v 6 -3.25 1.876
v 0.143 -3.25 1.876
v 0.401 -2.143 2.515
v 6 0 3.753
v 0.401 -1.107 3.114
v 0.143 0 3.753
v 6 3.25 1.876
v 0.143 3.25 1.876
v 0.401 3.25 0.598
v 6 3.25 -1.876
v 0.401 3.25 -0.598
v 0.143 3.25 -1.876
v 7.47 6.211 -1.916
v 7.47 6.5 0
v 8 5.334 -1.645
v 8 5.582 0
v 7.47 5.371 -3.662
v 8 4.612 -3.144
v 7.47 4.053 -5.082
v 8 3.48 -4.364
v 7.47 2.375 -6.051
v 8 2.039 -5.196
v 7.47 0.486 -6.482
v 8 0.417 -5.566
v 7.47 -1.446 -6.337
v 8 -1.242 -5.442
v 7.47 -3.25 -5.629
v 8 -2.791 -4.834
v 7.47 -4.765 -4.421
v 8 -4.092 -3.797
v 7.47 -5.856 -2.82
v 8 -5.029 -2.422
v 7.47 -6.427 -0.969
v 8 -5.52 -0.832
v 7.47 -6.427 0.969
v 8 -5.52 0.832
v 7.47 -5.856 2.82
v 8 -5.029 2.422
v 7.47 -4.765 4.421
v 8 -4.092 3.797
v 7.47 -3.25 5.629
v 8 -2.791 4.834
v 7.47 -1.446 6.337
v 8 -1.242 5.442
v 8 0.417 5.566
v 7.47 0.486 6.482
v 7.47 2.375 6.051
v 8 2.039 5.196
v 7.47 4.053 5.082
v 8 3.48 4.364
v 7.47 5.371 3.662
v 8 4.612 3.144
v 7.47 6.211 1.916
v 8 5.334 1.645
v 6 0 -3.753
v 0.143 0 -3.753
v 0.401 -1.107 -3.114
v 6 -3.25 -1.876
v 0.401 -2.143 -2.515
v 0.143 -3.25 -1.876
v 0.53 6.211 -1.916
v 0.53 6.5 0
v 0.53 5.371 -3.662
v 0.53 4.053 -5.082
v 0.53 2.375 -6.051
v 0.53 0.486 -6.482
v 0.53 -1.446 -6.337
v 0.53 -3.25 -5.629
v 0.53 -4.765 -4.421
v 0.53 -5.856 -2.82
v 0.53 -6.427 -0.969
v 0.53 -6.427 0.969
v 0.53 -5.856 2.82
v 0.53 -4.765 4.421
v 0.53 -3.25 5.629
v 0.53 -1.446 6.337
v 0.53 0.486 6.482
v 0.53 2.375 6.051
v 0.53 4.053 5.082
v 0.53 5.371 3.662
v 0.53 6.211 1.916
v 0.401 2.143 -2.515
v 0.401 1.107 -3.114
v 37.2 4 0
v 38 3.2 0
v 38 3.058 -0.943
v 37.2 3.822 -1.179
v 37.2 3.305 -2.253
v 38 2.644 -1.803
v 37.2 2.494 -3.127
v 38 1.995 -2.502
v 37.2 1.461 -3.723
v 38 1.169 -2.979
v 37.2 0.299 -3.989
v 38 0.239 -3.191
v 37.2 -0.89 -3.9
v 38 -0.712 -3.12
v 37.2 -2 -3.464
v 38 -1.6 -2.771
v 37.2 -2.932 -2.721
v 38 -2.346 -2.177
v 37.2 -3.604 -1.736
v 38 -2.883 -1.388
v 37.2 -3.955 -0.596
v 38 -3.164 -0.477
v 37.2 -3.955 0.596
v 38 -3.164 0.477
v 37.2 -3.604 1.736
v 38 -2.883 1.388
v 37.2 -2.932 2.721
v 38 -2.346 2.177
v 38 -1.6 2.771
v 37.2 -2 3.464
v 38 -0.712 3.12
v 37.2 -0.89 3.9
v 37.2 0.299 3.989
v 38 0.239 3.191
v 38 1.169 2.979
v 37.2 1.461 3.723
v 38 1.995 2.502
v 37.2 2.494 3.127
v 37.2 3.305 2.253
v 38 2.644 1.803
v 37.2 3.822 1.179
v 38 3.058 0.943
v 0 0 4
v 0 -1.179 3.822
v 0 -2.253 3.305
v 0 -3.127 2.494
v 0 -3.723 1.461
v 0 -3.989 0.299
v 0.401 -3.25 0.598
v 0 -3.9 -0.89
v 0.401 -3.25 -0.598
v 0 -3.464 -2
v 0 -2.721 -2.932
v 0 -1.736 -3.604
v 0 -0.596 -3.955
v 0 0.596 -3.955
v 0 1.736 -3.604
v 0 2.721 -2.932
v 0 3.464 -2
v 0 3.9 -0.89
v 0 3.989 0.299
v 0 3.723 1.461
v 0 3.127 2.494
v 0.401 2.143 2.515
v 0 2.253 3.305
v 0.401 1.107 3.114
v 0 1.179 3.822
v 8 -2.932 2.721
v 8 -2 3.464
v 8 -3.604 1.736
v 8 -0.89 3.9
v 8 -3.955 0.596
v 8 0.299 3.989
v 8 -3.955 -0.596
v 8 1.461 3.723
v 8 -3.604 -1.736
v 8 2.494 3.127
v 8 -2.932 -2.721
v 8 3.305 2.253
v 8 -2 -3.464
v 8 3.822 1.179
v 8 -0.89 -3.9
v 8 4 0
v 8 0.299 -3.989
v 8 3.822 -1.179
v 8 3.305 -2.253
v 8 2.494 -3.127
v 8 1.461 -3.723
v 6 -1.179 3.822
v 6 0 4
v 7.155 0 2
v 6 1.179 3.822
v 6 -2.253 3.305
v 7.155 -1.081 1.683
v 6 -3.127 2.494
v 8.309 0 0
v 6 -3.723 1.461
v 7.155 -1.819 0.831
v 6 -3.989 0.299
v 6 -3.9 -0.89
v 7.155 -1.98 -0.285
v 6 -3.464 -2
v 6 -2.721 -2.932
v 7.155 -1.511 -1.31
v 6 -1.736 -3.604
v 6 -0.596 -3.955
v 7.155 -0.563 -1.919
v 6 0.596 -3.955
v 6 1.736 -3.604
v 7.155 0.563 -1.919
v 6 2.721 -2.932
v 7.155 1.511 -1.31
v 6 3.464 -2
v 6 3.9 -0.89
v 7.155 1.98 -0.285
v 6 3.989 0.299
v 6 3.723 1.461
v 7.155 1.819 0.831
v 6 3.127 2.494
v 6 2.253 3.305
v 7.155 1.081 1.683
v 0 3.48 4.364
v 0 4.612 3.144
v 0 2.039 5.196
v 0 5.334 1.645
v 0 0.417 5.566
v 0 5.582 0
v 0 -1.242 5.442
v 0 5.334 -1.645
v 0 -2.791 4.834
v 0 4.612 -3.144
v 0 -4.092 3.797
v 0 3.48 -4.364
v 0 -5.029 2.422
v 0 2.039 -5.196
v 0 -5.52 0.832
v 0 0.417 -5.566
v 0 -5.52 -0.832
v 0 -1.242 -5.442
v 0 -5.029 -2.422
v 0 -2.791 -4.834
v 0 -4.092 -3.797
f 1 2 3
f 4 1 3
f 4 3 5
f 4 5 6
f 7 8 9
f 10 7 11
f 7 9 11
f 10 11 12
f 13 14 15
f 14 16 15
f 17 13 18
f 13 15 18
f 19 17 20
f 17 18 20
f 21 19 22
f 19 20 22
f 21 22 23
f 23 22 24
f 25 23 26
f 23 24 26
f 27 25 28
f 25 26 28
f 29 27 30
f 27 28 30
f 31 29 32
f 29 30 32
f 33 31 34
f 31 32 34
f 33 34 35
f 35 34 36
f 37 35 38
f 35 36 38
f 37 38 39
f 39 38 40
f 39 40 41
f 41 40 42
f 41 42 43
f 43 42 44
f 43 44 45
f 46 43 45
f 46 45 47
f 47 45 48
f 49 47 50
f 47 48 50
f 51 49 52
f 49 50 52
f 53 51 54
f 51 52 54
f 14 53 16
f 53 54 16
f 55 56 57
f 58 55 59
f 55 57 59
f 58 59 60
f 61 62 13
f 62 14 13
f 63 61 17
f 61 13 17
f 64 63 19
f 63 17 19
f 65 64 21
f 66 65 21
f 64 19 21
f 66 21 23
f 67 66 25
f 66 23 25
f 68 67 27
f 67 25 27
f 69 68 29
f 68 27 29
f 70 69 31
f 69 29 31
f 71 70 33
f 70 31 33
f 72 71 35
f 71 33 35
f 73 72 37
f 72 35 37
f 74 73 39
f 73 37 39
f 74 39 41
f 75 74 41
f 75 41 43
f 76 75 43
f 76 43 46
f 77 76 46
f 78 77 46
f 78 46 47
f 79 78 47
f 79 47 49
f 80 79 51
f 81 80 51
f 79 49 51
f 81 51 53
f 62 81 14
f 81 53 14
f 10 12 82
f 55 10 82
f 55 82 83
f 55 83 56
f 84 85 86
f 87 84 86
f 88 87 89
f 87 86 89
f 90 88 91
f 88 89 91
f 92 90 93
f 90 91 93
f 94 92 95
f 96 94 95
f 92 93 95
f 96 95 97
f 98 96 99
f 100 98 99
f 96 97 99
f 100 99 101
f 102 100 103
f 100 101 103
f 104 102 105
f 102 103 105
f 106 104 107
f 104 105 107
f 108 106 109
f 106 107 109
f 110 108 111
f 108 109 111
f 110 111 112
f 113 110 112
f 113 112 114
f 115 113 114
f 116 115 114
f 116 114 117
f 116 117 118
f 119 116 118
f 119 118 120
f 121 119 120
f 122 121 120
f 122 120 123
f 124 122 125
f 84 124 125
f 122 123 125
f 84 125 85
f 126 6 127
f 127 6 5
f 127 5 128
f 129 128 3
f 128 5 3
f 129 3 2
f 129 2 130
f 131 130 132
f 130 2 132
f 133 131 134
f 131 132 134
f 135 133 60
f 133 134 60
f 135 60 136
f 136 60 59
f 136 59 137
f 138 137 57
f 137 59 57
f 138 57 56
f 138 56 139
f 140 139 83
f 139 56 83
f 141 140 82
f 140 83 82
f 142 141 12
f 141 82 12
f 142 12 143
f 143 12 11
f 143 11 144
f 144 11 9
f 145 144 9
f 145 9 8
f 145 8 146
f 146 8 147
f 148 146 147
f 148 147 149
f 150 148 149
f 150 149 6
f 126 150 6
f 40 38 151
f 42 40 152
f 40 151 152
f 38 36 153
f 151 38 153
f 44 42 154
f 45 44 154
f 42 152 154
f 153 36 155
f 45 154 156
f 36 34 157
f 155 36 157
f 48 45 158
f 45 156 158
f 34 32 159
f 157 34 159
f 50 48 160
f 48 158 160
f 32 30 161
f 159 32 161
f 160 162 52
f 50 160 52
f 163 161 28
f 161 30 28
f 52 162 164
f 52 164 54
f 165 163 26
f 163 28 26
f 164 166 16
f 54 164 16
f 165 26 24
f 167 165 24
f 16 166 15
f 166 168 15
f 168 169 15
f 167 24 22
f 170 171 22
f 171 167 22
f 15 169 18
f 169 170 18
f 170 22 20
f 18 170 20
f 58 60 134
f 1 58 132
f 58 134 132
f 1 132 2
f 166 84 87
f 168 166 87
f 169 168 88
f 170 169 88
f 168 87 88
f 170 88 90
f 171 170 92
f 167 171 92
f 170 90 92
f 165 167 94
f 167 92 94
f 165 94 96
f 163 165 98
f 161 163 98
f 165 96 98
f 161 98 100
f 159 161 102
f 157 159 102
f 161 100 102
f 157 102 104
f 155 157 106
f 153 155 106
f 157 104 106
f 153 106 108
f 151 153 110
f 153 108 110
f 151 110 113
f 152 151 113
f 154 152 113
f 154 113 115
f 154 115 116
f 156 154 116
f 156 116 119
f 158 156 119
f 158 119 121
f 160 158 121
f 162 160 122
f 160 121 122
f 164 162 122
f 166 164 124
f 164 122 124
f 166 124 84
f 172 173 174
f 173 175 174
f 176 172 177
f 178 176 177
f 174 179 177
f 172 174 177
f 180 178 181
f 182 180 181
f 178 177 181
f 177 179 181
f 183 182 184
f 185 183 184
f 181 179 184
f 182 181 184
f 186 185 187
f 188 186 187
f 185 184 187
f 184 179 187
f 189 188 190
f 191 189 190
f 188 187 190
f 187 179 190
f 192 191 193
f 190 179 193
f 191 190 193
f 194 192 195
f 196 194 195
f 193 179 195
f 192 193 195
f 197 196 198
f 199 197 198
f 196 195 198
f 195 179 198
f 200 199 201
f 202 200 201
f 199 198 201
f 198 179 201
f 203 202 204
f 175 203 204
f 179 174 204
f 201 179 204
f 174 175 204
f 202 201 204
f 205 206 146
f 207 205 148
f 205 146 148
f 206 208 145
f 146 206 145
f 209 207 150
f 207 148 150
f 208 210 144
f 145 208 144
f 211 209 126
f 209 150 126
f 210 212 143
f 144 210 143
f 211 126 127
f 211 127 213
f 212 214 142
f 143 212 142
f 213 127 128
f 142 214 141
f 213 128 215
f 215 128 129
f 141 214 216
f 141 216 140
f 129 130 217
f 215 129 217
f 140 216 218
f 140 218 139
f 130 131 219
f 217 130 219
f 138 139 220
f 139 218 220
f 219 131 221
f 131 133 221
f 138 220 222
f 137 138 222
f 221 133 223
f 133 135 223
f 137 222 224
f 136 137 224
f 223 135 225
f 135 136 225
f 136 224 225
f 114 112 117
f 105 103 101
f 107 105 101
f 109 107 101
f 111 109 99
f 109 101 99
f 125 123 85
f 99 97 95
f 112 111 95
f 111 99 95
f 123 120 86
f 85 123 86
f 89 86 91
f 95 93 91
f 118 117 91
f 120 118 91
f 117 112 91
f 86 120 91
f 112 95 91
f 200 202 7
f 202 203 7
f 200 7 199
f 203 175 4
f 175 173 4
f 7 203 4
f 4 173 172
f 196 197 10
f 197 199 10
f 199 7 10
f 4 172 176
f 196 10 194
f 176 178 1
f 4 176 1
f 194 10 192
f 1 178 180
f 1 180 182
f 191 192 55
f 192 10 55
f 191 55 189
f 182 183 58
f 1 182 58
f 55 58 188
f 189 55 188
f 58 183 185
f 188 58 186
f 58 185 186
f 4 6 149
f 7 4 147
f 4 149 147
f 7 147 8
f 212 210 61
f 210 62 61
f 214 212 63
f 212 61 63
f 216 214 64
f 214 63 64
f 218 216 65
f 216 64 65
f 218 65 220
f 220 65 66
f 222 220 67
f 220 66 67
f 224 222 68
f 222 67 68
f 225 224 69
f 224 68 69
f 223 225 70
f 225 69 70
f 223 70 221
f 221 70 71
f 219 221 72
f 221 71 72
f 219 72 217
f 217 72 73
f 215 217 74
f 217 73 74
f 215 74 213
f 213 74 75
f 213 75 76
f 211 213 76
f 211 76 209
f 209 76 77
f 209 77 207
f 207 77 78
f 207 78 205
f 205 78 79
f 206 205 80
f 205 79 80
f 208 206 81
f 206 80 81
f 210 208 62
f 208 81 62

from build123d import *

# Parameters (mm, degrees)
CHAMFER1_SIZE      = 0.8
CUT_EXTRUDE1_DEPTH = 6


with BuildPart() as part:
    # Sketch1 → Revolve1 (revolve)
    with BuildSketch(Plane.XY):
        Polygon((0, 0), (0, 5.582013072), (0.53, 6.5), (7.47, 6.5), (8, 5.582013072), (8, 4), (38, 4), (38, 0), align=None)
    revolve(axis=Axis((38, 0, 0), (-1, 0, 0)))

    # Chamfer1
    chamfer1_edges = [part.edges().sort_by_distance(p)[0] for p in [
        (38, -4, 0),
    ]]
    chamfer(chamfer1_edges, length=CHAMFER1_SIZE)

    # Sketch2 → Cut-Extrude1 (cut)
    with BuildSketch(Plane.ZY):
        Polygon((3.75277675, 0), (1.876388375, 3.25), (-1.876388375, 3.25), (-3.75277675, 0), (-1.876388375, -3.25), (1.876388375, -3.25), align=None)
    extrude(amount=-CUT_EXTRUDE1_DEPTH, mode=Mode.SUBTRACT)

    # Sketch4 → Cut-Revolve1 (revolve, cut)
    with BuildSketch(Plane.XY, mode=Mode.PRIVATE) as cut_revolve1_sk:
        Polygon((0, 0), (0, 4), (2.309401077, 0), align=None)
        Polygon((6, 0), (6, 4), (8.309401077, 0), align=None)
    revolve(cut_revolve1_sk.sketch.rotate(Axis((0, 0, 0), (1, 0, 0)), 90), axis=Axis((0, 0, 0), (1, 0, 0)), mode=Mode.SUBTRACT)


solid = part.part
